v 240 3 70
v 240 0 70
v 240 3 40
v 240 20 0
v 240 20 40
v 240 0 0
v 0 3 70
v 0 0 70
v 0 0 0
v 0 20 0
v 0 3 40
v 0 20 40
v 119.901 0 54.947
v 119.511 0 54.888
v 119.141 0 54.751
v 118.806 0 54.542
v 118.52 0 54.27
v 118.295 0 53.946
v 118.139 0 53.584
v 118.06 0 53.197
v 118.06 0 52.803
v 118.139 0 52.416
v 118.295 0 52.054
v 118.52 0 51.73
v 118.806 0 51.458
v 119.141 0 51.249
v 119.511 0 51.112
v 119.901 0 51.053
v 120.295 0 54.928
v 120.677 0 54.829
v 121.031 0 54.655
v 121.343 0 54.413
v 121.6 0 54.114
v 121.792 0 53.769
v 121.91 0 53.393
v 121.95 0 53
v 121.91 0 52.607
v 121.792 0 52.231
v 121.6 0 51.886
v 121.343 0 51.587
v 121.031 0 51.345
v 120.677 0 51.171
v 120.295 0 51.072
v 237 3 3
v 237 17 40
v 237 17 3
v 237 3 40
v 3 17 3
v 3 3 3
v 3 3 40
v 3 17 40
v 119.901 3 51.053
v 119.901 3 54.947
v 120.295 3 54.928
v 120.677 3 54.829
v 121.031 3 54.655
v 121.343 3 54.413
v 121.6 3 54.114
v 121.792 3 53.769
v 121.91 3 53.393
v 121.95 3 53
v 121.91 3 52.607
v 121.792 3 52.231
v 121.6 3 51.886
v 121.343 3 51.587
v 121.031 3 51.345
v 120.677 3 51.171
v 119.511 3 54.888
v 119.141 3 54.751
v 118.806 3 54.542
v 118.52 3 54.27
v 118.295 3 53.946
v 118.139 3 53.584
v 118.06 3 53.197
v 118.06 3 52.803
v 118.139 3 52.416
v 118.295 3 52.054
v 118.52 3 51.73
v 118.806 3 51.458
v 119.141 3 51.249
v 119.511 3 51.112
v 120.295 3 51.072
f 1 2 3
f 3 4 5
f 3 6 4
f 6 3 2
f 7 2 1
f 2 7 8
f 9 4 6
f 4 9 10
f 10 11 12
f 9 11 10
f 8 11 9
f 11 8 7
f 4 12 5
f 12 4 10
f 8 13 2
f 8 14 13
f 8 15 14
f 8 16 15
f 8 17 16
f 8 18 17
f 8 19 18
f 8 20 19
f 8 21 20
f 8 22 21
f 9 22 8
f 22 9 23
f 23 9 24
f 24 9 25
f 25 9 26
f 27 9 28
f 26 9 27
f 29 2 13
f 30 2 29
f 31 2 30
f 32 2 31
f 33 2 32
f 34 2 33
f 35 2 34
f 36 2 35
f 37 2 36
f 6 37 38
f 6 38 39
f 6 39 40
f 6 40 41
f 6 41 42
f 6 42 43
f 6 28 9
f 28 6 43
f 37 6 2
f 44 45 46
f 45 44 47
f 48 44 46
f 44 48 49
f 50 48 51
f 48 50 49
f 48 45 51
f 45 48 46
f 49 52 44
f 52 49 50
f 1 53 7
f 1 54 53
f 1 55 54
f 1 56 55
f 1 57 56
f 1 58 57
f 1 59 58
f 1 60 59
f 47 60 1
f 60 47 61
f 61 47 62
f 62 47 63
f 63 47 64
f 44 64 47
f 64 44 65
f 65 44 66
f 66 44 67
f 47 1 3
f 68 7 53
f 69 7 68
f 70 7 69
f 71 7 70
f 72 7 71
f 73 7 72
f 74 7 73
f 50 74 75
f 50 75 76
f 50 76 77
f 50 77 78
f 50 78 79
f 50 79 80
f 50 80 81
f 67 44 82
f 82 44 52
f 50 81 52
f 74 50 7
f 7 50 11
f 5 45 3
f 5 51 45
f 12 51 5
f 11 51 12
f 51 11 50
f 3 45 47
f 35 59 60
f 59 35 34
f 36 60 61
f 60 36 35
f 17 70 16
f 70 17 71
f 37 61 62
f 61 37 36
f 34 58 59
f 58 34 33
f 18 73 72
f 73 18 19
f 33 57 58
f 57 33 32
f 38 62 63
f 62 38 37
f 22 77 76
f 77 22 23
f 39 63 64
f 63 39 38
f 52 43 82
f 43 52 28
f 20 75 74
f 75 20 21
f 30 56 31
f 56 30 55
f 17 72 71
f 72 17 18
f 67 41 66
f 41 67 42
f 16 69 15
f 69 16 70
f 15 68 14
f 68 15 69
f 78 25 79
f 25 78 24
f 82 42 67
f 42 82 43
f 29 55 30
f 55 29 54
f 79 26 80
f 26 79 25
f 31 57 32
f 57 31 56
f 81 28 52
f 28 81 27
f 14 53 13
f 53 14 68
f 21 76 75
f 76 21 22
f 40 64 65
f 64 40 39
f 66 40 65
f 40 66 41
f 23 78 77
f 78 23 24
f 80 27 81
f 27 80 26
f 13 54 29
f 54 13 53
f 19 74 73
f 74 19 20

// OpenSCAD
// The resolution variables:
$fa = 1;
$fs = 0.4;

//Variables
mainBodyX = 240;
mainBodyY = 20;
mainBodyZ = 40;
backWallZ = 70;
wallsThickness = 3;
screwHoleRadius = 3.9 / 2;
screwHoleZ = 53;

// Main body
difference(){
    cube([mainBodyX,mainBodyY,backWallZ]);
    translate([wallsThickness, wallsThickness, wallsThickness])
        cube([mainBodyX - (wallsThickness * 2), mainBodyY - (wallsThickness * 2), backWallZ - wallsThickness]);
    translate([-2,wallsThickness,mainBodyZ])
        cube([mainBodyX + 5, mainBodyY + 5,backWallZ]);
    translate([mainBodyX / 2, 5, screwHoleZ])
        rotate([90, 0, 0])
            cylinder(h = (mainBodyY / 2), r = screwHoleRadius);
}

// translate([mainBodyX * 2, -2, screwHoleZ])
//         rotate([90, 0, 0])
//             cylinder(h = mainBodyY / 2, r = screwHoleRadius);
